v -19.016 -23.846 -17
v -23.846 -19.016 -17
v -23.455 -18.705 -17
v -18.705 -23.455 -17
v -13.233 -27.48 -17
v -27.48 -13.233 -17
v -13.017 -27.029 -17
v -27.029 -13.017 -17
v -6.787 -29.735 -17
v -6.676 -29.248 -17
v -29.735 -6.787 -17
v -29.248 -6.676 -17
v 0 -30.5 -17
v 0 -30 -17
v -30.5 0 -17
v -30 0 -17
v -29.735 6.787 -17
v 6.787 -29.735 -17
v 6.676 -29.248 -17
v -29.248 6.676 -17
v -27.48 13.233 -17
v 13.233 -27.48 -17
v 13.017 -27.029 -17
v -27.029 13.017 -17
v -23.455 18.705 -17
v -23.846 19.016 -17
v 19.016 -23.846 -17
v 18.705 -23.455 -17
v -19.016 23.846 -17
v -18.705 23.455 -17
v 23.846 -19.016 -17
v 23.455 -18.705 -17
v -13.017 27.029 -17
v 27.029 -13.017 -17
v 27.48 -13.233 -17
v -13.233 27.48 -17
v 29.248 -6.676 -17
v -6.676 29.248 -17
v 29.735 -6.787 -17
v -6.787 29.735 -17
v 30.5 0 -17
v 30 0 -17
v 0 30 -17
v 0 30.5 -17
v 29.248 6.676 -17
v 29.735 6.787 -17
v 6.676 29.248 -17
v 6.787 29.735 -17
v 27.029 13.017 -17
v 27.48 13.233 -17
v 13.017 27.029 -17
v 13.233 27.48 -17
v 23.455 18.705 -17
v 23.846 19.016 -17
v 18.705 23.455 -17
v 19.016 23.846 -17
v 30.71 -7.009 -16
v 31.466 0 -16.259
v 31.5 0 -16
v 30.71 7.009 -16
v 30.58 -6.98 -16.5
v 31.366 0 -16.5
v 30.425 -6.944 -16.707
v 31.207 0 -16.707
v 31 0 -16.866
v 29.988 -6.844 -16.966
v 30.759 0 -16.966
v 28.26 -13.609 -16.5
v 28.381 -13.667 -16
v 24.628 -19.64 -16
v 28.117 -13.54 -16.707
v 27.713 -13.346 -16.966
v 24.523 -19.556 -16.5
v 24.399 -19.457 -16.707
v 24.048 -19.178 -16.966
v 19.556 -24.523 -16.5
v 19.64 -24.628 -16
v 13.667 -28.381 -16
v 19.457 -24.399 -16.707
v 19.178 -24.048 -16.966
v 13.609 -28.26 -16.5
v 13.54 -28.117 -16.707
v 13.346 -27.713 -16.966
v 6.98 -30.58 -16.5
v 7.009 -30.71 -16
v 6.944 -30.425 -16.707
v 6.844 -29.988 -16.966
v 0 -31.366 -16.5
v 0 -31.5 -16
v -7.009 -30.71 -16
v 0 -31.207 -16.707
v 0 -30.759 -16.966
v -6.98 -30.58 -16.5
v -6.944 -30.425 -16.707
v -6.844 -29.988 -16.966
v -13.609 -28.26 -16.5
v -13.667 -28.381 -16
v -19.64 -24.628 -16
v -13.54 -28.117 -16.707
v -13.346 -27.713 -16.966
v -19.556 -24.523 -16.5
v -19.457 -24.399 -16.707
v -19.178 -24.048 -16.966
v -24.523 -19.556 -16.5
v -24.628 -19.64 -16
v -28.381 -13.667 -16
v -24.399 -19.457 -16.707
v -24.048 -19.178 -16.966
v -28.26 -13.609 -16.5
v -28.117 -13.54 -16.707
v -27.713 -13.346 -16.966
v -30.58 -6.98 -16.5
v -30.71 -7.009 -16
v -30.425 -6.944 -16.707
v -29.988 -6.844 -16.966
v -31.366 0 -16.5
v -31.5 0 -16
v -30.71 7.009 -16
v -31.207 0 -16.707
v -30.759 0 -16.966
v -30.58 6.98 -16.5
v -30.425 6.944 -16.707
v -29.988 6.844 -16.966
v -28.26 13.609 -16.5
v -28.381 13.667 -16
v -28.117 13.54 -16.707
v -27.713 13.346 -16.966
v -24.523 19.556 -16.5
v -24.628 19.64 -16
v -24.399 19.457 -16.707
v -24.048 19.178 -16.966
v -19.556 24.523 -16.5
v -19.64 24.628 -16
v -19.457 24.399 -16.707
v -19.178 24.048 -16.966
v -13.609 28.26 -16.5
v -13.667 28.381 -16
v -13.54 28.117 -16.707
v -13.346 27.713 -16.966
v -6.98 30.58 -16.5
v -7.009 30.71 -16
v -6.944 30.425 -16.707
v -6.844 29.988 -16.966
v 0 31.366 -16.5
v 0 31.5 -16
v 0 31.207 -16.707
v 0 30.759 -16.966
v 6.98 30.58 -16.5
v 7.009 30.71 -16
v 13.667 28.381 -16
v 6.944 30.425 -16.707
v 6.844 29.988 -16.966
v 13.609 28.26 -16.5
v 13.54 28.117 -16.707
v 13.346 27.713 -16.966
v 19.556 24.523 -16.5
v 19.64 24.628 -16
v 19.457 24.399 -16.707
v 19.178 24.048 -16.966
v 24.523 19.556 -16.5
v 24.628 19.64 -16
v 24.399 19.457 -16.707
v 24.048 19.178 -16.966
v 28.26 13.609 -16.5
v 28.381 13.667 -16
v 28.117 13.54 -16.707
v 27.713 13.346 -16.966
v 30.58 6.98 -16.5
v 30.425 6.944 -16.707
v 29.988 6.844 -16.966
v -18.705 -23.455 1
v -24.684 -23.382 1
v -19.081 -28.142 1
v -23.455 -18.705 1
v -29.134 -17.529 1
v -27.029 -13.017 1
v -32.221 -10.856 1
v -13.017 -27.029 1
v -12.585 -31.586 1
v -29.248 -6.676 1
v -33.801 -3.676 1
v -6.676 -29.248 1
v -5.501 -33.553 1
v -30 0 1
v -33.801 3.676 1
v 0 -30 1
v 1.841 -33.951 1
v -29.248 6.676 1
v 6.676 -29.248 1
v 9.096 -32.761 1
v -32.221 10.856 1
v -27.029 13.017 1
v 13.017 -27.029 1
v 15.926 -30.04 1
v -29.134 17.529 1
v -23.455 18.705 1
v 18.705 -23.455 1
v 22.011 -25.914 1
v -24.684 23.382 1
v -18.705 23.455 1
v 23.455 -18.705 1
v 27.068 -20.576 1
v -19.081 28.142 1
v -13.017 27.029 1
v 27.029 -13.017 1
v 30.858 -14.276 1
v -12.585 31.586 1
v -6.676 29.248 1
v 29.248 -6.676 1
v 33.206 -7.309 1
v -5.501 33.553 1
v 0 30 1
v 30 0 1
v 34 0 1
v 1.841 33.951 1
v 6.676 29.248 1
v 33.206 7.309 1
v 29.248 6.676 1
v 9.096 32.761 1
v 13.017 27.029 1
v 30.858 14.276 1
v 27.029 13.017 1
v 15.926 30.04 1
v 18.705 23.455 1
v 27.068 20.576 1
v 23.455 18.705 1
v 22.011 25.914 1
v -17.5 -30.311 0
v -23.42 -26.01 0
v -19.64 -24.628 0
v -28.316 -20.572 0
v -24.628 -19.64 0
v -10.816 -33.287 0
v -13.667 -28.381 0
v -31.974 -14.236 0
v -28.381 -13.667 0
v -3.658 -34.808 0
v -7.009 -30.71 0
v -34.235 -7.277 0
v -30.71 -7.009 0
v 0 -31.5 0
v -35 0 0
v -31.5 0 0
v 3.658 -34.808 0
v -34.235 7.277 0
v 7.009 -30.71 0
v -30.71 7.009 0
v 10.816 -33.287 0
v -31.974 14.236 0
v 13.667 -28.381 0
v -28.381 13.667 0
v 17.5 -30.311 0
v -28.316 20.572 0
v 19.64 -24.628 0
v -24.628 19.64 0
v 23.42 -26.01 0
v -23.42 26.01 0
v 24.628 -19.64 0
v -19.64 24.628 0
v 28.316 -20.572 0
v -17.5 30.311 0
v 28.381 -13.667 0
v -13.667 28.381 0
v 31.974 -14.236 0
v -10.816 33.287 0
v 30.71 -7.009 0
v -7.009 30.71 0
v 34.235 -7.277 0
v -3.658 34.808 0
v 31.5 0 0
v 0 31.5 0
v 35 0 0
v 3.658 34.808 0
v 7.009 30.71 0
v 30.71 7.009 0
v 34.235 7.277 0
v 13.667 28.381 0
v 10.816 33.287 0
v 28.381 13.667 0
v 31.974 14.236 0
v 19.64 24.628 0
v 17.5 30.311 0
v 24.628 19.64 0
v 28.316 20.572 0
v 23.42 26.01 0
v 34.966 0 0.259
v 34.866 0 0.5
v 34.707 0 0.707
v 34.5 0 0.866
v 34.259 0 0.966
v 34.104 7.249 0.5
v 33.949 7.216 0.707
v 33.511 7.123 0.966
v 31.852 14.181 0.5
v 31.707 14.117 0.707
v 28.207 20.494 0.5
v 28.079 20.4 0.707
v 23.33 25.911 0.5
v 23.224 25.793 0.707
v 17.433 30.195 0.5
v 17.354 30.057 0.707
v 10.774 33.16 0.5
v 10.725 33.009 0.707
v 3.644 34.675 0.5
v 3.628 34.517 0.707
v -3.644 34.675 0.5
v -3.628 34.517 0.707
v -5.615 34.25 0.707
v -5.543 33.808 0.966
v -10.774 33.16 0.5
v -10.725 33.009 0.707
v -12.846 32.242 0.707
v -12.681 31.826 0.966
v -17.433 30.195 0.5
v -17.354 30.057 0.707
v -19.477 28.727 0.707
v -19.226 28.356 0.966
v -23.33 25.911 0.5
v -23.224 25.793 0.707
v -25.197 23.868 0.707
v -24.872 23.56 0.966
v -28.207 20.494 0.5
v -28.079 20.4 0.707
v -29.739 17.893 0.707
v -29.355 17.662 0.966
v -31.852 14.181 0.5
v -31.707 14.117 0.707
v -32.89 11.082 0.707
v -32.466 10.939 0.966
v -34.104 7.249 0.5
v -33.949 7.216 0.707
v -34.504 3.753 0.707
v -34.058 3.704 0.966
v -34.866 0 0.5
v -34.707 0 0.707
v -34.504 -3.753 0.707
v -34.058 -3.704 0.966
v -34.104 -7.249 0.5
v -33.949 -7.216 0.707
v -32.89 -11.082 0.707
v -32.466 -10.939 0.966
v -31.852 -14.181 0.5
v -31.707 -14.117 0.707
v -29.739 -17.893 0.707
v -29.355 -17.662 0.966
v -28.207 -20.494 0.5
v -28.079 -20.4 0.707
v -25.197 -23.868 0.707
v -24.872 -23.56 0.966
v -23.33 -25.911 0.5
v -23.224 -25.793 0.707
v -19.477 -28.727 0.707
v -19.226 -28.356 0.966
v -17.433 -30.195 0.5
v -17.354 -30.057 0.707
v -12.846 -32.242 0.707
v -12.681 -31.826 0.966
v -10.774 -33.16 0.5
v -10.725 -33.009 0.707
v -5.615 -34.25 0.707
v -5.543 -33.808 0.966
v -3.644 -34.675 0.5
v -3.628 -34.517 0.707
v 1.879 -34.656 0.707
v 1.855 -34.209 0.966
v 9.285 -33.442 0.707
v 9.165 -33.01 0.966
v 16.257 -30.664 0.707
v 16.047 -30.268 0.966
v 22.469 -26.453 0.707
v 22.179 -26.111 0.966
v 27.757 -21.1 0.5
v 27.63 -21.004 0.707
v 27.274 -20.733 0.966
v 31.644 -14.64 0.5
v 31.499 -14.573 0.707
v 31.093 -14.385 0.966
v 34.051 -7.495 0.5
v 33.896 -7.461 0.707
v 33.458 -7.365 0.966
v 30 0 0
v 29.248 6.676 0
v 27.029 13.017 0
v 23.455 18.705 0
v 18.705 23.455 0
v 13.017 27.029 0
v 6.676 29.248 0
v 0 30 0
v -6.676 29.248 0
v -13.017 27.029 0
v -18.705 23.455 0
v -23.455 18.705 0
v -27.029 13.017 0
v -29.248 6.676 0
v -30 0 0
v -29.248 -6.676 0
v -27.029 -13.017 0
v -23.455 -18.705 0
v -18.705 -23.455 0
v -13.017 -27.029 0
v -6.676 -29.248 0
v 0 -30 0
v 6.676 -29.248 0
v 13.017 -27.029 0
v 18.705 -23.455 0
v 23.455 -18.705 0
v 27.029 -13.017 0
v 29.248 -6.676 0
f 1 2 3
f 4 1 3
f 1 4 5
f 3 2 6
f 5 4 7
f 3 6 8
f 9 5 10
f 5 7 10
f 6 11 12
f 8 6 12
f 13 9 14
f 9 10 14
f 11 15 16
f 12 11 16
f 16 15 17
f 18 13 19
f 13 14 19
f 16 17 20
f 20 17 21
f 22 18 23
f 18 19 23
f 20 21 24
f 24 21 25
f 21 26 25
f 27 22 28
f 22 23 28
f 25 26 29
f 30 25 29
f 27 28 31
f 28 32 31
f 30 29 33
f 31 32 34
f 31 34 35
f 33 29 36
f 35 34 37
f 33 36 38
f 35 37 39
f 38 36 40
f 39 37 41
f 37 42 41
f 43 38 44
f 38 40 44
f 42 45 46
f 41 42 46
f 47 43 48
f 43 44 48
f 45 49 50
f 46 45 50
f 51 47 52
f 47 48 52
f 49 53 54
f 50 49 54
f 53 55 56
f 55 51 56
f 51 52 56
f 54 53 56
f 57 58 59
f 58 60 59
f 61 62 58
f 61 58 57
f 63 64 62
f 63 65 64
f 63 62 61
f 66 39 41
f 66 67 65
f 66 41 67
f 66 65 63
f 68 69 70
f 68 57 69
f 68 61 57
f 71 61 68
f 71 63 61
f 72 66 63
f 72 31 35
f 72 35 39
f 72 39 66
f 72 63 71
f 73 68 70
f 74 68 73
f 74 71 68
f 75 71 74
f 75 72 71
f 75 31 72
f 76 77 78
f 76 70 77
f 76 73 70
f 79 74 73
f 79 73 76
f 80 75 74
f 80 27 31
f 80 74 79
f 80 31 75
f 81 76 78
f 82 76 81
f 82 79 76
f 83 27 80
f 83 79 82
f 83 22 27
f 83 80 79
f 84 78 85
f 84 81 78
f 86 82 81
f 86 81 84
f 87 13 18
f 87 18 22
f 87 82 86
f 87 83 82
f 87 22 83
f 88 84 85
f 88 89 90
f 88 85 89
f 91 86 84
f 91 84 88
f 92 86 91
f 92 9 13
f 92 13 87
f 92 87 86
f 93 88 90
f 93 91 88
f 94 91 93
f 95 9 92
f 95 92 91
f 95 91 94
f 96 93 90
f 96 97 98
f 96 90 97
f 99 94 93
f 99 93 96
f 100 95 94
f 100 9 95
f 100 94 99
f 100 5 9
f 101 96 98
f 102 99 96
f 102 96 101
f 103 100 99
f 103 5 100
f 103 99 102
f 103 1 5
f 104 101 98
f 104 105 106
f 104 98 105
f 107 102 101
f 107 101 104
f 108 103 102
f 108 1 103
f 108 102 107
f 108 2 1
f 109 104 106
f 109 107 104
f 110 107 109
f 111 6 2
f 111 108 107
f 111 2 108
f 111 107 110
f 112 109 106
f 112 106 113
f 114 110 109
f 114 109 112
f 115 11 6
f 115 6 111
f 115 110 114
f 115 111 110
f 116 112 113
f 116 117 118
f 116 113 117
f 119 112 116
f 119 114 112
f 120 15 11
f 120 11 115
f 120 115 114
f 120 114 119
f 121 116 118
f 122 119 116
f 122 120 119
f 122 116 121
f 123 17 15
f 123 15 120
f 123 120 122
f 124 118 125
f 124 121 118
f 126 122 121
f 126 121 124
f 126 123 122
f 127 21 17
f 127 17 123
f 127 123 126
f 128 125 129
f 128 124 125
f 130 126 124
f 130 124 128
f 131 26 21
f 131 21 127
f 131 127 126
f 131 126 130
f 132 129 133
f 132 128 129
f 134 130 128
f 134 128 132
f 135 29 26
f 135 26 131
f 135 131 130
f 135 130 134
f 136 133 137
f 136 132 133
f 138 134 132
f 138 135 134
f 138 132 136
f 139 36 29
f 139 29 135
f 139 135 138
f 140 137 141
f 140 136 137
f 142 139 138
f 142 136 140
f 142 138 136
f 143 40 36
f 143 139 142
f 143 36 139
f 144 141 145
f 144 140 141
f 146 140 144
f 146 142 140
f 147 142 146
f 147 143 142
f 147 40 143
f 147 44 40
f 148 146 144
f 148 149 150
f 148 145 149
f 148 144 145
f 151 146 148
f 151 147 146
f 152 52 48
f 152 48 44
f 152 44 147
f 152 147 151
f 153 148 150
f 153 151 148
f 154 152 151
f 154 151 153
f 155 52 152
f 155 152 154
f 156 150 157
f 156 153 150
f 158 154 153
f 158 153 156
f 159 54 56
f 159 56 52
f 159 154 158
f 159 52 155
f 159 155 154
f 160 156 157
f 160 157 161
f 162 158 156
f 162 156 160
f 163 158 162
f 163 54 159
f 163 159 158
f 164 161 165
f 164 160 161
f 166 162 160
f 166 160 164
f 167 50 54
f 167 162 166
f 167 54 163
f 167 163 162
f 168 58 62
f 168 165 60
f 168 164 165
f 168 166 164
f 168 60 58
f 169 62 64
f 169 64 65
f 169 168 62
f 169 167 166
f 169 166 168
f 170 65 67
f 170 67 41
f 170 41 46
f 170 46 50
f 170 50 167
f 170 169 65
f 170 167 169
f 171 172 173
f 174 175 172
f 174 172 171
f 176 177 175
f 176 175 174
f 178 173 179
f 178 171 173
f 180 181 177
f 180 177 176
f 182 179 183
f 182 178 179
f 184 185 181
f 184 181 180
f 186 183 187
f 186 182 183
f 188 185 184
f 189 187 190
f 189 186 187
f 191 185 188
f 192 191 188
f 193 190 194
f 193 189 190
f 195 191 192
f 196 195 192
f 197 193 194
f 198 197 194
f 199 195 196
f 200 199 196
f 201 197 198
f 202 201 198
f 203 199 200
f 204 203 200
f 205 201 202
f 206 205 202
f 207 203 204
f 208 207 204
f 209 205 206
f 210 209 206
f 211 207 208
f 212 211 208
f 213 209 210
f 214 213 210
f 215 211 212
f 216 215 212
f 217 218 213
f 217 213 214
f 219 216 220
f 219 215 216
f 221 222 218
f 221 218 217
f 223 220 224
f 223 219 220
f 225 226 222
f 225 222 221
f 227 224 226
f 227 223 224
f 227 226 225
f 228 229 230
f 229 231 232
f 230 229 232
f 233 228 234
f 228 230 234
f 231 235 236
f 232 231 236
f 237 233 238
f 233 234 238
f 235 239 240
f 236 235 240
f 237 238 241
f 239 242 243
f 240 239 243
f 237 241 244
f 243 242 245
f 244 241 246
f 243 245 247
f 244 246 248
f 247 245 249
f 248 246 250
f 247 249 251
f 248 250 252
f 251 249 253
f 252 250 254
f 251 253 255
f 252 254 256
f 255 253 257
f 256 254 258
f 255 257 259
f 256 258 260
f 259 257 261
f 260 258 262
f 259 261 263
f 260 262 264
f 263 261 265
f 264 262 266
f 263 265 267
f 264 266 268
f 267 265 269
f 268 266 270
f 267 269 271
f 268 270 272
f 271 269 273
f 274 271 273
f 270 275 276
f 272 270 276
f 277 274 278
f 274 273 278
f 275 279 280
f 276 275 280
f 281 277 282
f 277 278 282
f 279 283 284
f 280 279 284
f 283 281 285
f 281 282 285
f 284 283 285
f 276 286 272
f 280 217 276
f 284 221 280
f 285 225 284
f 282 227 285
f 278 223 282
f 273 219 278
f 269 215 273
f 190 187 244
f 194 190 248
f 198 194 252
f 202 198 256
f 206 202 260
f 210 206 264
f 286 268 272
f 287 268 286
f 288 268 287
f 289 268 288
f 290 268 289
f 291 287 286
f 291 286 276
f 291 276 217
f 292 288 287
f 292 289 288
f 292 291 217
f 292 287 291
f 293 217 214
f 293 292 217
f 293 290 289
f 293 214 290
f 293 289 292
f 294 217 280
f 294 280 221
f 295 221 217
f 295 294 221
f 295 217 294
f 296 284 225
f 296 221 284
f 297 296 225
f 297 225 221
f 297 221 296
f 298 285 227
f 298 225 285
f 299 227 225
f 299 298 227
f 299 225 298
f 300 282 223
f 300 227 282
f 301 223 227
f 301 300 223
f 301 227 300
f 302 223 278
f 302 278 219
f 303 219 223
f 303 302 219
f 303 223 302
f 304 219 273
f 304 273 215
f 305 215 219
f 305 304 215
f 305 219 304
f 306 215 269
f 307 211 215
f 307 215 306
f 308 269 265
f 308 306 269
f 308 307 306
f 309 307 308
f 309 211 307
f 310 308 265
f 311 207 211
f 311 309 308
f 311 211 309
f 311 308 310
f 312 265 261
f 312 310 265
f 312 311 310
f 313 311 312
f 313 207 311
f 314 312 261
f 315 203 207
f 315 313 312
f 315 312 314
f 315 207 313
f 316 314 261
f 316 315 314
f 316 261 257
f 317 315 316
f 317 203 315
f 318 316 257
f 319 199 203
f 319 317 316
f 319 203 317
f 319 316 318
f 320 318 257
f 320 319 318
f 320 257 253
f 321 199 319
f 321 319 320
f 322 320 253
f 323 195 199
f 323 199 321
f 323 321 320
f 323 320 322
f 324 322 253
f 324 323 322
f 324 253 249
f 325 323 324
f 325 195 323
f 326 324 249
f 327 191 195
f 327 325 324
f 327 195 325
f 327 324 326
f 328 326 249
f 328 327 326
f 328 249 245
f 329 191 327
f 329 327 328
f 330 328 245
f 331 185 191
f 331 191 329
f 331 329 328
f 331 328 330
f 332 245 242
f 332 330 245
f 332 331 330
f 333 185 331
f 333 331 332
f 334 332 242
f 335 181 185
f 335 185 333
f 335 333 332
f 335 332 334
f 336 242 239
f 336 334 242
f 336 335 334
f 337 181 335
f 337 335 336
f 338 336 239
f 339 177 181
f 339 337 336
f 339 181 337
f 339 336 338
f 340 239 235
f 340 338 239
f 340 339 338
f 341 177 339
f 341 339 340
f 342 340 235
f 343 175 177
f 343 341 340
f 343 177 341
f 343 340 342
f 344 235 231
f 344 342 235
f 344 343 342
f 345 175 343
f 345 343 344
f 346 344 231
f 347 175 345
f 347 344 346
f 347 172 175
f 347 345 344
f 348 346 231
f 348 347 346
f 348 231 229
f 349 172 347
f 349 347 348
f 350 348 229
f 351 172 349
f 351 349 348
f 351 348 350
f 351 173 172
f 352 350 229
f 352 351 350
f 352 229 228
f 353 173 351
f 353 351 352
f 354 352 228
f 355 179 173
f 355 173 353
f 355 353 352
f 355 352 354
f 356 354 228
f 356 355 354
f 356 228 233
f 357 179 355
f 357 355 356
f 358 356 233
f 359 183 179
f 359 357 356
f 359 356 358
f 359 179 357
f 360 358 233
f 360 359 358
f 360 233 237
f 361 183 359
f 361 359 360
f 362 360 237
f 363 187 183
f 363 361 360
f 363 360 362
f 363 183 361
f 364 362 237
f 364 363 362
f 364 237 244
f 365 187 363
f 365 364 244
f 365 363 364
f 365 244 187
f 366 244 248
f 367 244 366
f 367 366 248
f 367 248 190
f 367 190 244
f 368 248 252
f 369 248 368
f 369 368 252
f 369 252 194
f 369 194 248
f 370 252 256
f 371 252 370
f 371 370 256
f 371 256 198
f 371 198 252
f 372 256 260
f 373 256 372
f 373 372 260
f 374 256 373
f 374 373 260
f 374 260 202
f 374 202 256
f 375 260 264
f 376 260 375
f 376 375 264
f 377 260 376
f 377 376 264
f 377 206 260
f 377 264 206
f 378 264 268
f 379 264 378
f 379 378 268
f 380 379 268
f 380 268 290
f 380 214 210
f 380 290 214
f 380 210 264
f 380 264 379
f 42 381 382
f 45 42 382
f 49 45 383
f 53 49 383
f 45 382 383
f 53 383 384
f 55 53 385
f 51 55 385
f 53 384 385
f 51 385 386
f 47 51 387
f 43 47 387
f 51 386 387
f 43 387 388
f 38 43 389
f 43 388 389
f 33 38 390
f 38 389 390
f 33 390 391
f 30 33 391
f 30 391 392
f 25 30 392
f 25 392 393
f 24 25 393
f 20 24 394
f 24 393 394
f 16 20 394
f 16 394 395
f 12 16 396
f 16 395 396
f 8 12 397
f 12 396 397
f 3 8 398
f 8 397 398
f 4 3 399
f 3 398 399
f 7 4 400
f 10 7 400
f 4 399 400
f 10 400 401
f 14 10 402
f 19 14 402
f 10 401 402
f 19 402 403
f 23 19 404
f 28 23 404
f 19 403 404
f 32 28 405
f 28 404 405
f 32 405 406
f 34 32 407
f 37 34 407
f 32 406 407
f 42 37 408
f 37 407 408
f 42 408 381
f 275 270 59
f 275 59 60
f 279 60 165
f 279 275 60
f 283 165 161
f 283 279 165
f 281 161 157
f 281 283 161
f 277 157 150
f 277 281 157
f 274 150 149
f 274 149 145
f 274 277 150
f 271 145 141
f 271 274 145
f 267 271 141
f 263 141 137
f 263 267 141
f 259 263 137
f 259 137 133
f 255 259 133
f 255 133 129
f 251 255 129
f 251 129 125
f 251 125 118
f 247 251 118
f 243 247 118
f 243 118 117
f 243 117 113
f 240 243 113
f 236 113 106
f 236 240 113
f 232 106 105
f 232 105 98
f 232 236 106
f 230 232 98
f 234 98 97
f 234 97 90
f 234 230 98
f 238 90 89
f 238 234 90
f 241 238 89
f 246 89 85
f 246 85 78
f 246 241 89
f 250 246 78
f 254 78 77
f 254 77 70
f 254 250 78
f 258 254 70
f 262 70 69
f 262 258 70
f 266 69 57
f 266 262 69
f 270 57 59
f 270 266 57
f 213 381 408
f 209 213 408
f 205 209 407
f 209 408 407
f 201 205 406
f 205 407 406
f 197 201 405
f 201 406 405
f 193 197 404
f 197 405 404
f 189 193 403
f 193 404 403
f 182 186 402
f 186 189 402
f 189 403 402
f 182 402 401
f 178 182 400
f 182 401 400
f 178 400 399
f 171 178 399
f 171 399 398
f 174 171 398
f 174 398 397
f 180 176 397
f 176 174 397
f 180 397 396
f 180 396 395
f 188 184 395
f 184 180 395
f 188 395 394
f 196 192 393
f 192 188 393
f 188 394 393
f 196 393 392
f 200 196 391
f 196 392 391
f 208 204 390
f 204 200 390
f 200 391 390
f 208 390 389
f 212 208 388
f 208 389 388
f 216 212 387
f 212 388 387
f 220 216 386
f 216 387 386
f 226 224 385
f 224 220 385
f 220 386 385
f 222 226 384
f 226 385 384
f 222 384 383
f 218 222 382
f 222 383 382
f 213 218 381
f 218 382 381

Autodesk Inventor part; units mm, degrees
ref_plane "YZ Plane" through (0, 0, 0) normal (1, 0, 0) x (0, 1, 0)
ref_plane "XZ Plane" through (0, 0, 0) normal (0, 1, 0) x (-1, 0, 0)
ref_plane "XY Plane" through (0, 0, 0) normal (0, 0, 1) x (1, 0, 0)
sketch "Sketch1" plane through (0, 0, 0) normal (0, 0, 1) x (1, 0, 0)
  circle A0 centre (0, 0) radius 31.5
  circle A1 centre (0, 0) radius 30
  circle A2 centre (0, 0) radius 35
  dimension "d0" = 63
  dimension "d1" = 60
  dimension "d2" = 70
extrude "Extrusion1" add sketch "Sketch1" along normal blind 1 contours A0 | A2
extrude "Extrusion2" add sketch "Sketch1" against normal blind 17 contours A0
fillet "Fillet1" radius 1 1 edges at (-35, 0, 1)
fillet "Fillet2" radius 1 1 edges at (-31.5, 0, -17)
properties part number "Hole64mm"
